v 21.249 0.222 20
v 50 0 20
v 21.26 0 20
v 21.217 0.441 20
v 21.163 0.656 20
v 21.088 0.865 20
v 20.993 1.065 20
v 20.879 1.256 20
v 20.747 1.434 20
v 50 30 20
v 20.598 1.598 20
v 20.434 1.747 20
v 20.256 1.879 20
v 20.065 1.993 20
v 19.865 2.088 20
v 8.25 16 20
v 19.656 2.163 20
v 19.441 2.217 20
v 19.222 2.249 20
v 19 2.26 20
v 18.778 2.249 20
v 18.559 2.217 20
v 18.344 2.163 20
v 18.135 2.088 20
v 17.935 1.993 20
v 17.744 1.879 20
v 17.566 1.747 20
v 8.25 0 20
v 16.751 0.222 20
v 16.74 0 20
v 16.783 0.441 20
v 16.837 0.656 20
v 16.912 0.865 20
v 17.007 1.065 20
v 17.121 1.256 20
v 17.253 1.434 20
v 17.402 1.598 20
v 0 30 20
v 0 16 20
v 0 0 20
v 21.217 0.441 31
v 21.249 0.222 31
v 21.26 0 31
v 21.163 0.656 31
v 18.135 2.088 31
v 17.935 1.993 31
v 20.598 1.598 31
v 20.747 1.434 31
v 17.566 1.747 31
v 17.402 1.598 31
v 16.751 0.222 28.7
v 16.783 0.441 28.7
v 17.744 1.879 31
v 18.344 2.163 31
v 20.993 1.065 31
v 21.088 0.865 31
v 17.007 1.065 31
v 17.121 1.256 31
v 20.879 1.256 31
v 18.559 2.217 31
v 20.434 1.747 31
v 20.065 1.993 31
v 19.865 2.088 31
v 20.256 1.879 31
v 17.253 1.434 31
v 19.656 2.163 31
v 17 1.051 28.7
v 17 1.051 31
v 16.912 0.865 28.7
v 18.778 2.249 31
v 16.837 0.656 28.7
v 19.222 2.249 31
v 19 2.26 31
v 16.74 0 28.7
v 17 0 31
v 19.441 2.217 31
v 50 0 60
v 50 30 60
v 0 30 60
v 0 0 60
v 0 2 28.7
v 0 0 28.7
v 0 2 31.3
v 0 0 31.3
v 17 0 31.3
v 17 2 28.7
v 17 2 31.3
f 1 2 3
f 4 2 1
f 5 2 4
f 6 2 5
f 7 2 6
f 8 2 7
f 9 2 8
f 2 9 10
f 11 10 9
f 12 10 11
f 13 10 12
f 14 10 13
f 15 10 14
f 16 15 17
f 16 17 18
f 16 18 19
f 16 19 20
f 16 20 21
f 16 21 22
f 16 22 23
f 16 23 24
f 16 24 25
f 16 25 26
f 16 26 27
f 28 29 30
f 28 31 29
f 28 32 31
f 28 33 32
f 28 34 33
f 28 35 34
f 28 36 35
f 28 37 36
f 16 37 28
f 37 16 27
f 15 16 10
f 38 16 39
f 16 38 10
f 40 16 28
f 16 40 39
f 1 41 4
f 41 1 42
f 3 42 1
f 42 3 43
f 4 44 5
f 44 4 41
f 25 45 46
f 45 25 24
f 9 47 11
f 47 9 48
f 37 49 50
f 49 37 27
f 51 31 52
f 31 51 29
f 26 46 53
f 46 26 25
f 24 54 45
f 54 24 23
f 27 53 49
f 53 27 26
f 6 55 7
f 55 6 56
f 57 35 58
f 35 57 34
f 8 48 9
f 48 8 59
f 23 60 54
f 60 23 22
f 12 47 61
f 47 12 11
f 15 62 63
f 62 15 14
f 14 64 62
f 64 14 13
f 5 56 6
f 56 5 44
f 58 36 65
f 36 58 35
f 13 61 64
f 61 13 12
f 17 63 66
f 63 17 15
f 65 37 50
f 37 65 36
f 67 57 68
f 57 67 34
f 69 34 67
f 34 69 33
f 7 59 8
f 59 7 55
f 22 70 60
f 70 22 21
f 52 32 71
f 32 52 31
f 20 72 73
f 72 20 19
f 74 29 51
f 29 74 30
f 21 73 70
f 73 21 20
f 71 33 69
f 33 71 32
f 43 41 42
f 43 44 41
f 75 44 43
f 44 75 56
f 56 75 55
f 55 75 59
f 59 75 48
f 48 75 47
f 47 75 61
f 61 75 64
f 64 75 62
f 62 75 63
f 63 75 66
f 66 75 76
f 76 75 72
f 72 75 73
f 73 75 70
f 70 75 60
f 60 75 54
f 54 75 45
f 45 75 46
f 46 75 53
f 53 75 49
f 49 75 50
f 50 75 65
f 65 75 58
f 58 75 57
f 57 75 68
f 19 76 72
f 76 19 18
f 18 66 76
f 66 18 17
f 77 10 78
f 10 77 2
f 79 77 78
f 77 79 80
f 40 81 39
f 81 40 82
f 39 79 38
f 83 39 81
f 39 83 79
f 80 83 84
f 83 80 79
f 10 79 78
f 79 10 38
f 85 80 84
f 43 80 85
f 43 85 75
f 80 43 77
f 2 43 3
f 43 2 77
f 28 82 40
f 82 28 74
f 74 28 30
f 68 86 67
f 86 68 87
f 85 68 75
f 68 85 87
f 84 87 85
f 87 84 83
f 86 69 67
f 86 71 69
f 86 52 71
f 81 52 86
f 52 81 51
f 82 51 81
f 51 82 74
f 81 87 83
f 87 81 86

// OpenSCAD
// Wall-mounted syringe holder design

// --- Global Settings ---
$fn = 64; // High resolution for curves

// --- Dimensions (in mm) ---
holder_width = 50;      // Total width of the holder (X dimension)
holder_depth = 30;      // Total depth of the holder (Y dimension)
holder_height = 40;     // Total height of the holder (Z dimension)

barrel_diameter = 16;   // Syringe barrel diameter
barrel_channel_width = 16.5; // Width of the channel (X dimension)
flange_thickness = 2;   // Thickness of the syringe finger flange
flange_width = 32;      // Width of the syringe finger flange

wall_screw_hole_diameter = 4.5; // Diameter for M4 wall screws
wall_screw_hole_z = 15;  // Z position for screw holes

// --- Derived/Internal Dimensions ---
half_barrel_radius = barrel_diameter / 2; // 8 mm
channel_back_radius = 8.25; // Radius of the half-circle at the back end of the channel (R=8.25)
flange_slot_width = 34;  // Width of the flange slot (X dimension)
flange_slot_height = 2.6; // Height of the flange slot (Z dimension)
flange_slot_start_z = 30; // Start Z for flange slot
flange_slot_end_z = 32.6; // End Z for flange slot

// --- Positioning Constants ---
holder_center_x = 0;
holder_center_y = 0;

// --- Main Body ---
module base_holder() {
    // The holder must rest on the XY plane at z=0, so we shift it up by half its height.
    translate([0, 0, holder_height/2]) {
        cube([holder_width, holder_depth, holder_height]);
    }
}

// --- Features to Cut (Subtractions) ---

// 1. Syringe Barrel Channel Cut
module syringe_channel_cut() {
    difference() {
        // The volume to remove: A shape that matches the channel profile along Y.
        union() {
            // A long rectangular prism covering the straight section of the channel (X=16.5, Z=40)
            // This must be centered at X=0, Z=0 and span the full depth.
            cube([barrel_channel_width, holder_depth + 2, holder_height], center = true);

            // The curved back end piece: Half-cylinder centered at Y=15 (back face).
            // We translate it so its center aligns with the back face of the holder (Y = holder_depth/2)
            translate([0, holder_depth/2 + channel_back_radius - 1, 0]) {
                rotate([90, 0, 0]) { // Rotate cylinder axis to align with Y direction
                    // Cylinder height must be large enough to cover the width (X) of the channel.
                    cylinder(h = barrel_channel_width + 2, r = channel_back_radius, center = true);
                }
            }
        }
    }
}

// 2. Flange Slot Cut (Cut from front face back)
module flange_slot() {
    difference() {
        // The volume to remove: A rectangular prism spanning X=34, Z=2.6, and Y=depth of cut.
        // It is cut starting from the front face (Y = -holder_depth/2).
        translate([0, -holder_depth/2 + 1, flange_slot_start_z]) { // Start slightly inside the front face (y=-15)
            cube([flange_slot_width, holder_depth + 2, flange_slot_height], center = true);
        }
    }
}

// 3. Wall Screw Holes
module screw_holes() {
    difference() {
        // The volume to remove: Two cylinders running through the depth of the holder.
        union() {
            // Hole at X = -19 mm
            translate([-19, 0, wall_screw_hole_z]) {
                cylinder(h = holder_depth + 2, r = wall_screw_hole_diameter / 2 + 0.01, center = true); // Extend slightly past faces
            }

            // Hole at X = 19 mm
            translate([19, 0, wall_screw_hole_z]) {
                cylinder(h = holder_depth + 2, r = wall_screw_hole_diameter / 2 + 0.01, center = true); // Extend slightly past faces
            }
        }
    }
}


// --- Final Assembly ---

difference() {
    // Start with the base holder block (shifted to rest on Z=0)
    base_holder();

    // Subtract all required features
    syringe_channel_cut();
    flange_slot();
    screw_holes();
}
